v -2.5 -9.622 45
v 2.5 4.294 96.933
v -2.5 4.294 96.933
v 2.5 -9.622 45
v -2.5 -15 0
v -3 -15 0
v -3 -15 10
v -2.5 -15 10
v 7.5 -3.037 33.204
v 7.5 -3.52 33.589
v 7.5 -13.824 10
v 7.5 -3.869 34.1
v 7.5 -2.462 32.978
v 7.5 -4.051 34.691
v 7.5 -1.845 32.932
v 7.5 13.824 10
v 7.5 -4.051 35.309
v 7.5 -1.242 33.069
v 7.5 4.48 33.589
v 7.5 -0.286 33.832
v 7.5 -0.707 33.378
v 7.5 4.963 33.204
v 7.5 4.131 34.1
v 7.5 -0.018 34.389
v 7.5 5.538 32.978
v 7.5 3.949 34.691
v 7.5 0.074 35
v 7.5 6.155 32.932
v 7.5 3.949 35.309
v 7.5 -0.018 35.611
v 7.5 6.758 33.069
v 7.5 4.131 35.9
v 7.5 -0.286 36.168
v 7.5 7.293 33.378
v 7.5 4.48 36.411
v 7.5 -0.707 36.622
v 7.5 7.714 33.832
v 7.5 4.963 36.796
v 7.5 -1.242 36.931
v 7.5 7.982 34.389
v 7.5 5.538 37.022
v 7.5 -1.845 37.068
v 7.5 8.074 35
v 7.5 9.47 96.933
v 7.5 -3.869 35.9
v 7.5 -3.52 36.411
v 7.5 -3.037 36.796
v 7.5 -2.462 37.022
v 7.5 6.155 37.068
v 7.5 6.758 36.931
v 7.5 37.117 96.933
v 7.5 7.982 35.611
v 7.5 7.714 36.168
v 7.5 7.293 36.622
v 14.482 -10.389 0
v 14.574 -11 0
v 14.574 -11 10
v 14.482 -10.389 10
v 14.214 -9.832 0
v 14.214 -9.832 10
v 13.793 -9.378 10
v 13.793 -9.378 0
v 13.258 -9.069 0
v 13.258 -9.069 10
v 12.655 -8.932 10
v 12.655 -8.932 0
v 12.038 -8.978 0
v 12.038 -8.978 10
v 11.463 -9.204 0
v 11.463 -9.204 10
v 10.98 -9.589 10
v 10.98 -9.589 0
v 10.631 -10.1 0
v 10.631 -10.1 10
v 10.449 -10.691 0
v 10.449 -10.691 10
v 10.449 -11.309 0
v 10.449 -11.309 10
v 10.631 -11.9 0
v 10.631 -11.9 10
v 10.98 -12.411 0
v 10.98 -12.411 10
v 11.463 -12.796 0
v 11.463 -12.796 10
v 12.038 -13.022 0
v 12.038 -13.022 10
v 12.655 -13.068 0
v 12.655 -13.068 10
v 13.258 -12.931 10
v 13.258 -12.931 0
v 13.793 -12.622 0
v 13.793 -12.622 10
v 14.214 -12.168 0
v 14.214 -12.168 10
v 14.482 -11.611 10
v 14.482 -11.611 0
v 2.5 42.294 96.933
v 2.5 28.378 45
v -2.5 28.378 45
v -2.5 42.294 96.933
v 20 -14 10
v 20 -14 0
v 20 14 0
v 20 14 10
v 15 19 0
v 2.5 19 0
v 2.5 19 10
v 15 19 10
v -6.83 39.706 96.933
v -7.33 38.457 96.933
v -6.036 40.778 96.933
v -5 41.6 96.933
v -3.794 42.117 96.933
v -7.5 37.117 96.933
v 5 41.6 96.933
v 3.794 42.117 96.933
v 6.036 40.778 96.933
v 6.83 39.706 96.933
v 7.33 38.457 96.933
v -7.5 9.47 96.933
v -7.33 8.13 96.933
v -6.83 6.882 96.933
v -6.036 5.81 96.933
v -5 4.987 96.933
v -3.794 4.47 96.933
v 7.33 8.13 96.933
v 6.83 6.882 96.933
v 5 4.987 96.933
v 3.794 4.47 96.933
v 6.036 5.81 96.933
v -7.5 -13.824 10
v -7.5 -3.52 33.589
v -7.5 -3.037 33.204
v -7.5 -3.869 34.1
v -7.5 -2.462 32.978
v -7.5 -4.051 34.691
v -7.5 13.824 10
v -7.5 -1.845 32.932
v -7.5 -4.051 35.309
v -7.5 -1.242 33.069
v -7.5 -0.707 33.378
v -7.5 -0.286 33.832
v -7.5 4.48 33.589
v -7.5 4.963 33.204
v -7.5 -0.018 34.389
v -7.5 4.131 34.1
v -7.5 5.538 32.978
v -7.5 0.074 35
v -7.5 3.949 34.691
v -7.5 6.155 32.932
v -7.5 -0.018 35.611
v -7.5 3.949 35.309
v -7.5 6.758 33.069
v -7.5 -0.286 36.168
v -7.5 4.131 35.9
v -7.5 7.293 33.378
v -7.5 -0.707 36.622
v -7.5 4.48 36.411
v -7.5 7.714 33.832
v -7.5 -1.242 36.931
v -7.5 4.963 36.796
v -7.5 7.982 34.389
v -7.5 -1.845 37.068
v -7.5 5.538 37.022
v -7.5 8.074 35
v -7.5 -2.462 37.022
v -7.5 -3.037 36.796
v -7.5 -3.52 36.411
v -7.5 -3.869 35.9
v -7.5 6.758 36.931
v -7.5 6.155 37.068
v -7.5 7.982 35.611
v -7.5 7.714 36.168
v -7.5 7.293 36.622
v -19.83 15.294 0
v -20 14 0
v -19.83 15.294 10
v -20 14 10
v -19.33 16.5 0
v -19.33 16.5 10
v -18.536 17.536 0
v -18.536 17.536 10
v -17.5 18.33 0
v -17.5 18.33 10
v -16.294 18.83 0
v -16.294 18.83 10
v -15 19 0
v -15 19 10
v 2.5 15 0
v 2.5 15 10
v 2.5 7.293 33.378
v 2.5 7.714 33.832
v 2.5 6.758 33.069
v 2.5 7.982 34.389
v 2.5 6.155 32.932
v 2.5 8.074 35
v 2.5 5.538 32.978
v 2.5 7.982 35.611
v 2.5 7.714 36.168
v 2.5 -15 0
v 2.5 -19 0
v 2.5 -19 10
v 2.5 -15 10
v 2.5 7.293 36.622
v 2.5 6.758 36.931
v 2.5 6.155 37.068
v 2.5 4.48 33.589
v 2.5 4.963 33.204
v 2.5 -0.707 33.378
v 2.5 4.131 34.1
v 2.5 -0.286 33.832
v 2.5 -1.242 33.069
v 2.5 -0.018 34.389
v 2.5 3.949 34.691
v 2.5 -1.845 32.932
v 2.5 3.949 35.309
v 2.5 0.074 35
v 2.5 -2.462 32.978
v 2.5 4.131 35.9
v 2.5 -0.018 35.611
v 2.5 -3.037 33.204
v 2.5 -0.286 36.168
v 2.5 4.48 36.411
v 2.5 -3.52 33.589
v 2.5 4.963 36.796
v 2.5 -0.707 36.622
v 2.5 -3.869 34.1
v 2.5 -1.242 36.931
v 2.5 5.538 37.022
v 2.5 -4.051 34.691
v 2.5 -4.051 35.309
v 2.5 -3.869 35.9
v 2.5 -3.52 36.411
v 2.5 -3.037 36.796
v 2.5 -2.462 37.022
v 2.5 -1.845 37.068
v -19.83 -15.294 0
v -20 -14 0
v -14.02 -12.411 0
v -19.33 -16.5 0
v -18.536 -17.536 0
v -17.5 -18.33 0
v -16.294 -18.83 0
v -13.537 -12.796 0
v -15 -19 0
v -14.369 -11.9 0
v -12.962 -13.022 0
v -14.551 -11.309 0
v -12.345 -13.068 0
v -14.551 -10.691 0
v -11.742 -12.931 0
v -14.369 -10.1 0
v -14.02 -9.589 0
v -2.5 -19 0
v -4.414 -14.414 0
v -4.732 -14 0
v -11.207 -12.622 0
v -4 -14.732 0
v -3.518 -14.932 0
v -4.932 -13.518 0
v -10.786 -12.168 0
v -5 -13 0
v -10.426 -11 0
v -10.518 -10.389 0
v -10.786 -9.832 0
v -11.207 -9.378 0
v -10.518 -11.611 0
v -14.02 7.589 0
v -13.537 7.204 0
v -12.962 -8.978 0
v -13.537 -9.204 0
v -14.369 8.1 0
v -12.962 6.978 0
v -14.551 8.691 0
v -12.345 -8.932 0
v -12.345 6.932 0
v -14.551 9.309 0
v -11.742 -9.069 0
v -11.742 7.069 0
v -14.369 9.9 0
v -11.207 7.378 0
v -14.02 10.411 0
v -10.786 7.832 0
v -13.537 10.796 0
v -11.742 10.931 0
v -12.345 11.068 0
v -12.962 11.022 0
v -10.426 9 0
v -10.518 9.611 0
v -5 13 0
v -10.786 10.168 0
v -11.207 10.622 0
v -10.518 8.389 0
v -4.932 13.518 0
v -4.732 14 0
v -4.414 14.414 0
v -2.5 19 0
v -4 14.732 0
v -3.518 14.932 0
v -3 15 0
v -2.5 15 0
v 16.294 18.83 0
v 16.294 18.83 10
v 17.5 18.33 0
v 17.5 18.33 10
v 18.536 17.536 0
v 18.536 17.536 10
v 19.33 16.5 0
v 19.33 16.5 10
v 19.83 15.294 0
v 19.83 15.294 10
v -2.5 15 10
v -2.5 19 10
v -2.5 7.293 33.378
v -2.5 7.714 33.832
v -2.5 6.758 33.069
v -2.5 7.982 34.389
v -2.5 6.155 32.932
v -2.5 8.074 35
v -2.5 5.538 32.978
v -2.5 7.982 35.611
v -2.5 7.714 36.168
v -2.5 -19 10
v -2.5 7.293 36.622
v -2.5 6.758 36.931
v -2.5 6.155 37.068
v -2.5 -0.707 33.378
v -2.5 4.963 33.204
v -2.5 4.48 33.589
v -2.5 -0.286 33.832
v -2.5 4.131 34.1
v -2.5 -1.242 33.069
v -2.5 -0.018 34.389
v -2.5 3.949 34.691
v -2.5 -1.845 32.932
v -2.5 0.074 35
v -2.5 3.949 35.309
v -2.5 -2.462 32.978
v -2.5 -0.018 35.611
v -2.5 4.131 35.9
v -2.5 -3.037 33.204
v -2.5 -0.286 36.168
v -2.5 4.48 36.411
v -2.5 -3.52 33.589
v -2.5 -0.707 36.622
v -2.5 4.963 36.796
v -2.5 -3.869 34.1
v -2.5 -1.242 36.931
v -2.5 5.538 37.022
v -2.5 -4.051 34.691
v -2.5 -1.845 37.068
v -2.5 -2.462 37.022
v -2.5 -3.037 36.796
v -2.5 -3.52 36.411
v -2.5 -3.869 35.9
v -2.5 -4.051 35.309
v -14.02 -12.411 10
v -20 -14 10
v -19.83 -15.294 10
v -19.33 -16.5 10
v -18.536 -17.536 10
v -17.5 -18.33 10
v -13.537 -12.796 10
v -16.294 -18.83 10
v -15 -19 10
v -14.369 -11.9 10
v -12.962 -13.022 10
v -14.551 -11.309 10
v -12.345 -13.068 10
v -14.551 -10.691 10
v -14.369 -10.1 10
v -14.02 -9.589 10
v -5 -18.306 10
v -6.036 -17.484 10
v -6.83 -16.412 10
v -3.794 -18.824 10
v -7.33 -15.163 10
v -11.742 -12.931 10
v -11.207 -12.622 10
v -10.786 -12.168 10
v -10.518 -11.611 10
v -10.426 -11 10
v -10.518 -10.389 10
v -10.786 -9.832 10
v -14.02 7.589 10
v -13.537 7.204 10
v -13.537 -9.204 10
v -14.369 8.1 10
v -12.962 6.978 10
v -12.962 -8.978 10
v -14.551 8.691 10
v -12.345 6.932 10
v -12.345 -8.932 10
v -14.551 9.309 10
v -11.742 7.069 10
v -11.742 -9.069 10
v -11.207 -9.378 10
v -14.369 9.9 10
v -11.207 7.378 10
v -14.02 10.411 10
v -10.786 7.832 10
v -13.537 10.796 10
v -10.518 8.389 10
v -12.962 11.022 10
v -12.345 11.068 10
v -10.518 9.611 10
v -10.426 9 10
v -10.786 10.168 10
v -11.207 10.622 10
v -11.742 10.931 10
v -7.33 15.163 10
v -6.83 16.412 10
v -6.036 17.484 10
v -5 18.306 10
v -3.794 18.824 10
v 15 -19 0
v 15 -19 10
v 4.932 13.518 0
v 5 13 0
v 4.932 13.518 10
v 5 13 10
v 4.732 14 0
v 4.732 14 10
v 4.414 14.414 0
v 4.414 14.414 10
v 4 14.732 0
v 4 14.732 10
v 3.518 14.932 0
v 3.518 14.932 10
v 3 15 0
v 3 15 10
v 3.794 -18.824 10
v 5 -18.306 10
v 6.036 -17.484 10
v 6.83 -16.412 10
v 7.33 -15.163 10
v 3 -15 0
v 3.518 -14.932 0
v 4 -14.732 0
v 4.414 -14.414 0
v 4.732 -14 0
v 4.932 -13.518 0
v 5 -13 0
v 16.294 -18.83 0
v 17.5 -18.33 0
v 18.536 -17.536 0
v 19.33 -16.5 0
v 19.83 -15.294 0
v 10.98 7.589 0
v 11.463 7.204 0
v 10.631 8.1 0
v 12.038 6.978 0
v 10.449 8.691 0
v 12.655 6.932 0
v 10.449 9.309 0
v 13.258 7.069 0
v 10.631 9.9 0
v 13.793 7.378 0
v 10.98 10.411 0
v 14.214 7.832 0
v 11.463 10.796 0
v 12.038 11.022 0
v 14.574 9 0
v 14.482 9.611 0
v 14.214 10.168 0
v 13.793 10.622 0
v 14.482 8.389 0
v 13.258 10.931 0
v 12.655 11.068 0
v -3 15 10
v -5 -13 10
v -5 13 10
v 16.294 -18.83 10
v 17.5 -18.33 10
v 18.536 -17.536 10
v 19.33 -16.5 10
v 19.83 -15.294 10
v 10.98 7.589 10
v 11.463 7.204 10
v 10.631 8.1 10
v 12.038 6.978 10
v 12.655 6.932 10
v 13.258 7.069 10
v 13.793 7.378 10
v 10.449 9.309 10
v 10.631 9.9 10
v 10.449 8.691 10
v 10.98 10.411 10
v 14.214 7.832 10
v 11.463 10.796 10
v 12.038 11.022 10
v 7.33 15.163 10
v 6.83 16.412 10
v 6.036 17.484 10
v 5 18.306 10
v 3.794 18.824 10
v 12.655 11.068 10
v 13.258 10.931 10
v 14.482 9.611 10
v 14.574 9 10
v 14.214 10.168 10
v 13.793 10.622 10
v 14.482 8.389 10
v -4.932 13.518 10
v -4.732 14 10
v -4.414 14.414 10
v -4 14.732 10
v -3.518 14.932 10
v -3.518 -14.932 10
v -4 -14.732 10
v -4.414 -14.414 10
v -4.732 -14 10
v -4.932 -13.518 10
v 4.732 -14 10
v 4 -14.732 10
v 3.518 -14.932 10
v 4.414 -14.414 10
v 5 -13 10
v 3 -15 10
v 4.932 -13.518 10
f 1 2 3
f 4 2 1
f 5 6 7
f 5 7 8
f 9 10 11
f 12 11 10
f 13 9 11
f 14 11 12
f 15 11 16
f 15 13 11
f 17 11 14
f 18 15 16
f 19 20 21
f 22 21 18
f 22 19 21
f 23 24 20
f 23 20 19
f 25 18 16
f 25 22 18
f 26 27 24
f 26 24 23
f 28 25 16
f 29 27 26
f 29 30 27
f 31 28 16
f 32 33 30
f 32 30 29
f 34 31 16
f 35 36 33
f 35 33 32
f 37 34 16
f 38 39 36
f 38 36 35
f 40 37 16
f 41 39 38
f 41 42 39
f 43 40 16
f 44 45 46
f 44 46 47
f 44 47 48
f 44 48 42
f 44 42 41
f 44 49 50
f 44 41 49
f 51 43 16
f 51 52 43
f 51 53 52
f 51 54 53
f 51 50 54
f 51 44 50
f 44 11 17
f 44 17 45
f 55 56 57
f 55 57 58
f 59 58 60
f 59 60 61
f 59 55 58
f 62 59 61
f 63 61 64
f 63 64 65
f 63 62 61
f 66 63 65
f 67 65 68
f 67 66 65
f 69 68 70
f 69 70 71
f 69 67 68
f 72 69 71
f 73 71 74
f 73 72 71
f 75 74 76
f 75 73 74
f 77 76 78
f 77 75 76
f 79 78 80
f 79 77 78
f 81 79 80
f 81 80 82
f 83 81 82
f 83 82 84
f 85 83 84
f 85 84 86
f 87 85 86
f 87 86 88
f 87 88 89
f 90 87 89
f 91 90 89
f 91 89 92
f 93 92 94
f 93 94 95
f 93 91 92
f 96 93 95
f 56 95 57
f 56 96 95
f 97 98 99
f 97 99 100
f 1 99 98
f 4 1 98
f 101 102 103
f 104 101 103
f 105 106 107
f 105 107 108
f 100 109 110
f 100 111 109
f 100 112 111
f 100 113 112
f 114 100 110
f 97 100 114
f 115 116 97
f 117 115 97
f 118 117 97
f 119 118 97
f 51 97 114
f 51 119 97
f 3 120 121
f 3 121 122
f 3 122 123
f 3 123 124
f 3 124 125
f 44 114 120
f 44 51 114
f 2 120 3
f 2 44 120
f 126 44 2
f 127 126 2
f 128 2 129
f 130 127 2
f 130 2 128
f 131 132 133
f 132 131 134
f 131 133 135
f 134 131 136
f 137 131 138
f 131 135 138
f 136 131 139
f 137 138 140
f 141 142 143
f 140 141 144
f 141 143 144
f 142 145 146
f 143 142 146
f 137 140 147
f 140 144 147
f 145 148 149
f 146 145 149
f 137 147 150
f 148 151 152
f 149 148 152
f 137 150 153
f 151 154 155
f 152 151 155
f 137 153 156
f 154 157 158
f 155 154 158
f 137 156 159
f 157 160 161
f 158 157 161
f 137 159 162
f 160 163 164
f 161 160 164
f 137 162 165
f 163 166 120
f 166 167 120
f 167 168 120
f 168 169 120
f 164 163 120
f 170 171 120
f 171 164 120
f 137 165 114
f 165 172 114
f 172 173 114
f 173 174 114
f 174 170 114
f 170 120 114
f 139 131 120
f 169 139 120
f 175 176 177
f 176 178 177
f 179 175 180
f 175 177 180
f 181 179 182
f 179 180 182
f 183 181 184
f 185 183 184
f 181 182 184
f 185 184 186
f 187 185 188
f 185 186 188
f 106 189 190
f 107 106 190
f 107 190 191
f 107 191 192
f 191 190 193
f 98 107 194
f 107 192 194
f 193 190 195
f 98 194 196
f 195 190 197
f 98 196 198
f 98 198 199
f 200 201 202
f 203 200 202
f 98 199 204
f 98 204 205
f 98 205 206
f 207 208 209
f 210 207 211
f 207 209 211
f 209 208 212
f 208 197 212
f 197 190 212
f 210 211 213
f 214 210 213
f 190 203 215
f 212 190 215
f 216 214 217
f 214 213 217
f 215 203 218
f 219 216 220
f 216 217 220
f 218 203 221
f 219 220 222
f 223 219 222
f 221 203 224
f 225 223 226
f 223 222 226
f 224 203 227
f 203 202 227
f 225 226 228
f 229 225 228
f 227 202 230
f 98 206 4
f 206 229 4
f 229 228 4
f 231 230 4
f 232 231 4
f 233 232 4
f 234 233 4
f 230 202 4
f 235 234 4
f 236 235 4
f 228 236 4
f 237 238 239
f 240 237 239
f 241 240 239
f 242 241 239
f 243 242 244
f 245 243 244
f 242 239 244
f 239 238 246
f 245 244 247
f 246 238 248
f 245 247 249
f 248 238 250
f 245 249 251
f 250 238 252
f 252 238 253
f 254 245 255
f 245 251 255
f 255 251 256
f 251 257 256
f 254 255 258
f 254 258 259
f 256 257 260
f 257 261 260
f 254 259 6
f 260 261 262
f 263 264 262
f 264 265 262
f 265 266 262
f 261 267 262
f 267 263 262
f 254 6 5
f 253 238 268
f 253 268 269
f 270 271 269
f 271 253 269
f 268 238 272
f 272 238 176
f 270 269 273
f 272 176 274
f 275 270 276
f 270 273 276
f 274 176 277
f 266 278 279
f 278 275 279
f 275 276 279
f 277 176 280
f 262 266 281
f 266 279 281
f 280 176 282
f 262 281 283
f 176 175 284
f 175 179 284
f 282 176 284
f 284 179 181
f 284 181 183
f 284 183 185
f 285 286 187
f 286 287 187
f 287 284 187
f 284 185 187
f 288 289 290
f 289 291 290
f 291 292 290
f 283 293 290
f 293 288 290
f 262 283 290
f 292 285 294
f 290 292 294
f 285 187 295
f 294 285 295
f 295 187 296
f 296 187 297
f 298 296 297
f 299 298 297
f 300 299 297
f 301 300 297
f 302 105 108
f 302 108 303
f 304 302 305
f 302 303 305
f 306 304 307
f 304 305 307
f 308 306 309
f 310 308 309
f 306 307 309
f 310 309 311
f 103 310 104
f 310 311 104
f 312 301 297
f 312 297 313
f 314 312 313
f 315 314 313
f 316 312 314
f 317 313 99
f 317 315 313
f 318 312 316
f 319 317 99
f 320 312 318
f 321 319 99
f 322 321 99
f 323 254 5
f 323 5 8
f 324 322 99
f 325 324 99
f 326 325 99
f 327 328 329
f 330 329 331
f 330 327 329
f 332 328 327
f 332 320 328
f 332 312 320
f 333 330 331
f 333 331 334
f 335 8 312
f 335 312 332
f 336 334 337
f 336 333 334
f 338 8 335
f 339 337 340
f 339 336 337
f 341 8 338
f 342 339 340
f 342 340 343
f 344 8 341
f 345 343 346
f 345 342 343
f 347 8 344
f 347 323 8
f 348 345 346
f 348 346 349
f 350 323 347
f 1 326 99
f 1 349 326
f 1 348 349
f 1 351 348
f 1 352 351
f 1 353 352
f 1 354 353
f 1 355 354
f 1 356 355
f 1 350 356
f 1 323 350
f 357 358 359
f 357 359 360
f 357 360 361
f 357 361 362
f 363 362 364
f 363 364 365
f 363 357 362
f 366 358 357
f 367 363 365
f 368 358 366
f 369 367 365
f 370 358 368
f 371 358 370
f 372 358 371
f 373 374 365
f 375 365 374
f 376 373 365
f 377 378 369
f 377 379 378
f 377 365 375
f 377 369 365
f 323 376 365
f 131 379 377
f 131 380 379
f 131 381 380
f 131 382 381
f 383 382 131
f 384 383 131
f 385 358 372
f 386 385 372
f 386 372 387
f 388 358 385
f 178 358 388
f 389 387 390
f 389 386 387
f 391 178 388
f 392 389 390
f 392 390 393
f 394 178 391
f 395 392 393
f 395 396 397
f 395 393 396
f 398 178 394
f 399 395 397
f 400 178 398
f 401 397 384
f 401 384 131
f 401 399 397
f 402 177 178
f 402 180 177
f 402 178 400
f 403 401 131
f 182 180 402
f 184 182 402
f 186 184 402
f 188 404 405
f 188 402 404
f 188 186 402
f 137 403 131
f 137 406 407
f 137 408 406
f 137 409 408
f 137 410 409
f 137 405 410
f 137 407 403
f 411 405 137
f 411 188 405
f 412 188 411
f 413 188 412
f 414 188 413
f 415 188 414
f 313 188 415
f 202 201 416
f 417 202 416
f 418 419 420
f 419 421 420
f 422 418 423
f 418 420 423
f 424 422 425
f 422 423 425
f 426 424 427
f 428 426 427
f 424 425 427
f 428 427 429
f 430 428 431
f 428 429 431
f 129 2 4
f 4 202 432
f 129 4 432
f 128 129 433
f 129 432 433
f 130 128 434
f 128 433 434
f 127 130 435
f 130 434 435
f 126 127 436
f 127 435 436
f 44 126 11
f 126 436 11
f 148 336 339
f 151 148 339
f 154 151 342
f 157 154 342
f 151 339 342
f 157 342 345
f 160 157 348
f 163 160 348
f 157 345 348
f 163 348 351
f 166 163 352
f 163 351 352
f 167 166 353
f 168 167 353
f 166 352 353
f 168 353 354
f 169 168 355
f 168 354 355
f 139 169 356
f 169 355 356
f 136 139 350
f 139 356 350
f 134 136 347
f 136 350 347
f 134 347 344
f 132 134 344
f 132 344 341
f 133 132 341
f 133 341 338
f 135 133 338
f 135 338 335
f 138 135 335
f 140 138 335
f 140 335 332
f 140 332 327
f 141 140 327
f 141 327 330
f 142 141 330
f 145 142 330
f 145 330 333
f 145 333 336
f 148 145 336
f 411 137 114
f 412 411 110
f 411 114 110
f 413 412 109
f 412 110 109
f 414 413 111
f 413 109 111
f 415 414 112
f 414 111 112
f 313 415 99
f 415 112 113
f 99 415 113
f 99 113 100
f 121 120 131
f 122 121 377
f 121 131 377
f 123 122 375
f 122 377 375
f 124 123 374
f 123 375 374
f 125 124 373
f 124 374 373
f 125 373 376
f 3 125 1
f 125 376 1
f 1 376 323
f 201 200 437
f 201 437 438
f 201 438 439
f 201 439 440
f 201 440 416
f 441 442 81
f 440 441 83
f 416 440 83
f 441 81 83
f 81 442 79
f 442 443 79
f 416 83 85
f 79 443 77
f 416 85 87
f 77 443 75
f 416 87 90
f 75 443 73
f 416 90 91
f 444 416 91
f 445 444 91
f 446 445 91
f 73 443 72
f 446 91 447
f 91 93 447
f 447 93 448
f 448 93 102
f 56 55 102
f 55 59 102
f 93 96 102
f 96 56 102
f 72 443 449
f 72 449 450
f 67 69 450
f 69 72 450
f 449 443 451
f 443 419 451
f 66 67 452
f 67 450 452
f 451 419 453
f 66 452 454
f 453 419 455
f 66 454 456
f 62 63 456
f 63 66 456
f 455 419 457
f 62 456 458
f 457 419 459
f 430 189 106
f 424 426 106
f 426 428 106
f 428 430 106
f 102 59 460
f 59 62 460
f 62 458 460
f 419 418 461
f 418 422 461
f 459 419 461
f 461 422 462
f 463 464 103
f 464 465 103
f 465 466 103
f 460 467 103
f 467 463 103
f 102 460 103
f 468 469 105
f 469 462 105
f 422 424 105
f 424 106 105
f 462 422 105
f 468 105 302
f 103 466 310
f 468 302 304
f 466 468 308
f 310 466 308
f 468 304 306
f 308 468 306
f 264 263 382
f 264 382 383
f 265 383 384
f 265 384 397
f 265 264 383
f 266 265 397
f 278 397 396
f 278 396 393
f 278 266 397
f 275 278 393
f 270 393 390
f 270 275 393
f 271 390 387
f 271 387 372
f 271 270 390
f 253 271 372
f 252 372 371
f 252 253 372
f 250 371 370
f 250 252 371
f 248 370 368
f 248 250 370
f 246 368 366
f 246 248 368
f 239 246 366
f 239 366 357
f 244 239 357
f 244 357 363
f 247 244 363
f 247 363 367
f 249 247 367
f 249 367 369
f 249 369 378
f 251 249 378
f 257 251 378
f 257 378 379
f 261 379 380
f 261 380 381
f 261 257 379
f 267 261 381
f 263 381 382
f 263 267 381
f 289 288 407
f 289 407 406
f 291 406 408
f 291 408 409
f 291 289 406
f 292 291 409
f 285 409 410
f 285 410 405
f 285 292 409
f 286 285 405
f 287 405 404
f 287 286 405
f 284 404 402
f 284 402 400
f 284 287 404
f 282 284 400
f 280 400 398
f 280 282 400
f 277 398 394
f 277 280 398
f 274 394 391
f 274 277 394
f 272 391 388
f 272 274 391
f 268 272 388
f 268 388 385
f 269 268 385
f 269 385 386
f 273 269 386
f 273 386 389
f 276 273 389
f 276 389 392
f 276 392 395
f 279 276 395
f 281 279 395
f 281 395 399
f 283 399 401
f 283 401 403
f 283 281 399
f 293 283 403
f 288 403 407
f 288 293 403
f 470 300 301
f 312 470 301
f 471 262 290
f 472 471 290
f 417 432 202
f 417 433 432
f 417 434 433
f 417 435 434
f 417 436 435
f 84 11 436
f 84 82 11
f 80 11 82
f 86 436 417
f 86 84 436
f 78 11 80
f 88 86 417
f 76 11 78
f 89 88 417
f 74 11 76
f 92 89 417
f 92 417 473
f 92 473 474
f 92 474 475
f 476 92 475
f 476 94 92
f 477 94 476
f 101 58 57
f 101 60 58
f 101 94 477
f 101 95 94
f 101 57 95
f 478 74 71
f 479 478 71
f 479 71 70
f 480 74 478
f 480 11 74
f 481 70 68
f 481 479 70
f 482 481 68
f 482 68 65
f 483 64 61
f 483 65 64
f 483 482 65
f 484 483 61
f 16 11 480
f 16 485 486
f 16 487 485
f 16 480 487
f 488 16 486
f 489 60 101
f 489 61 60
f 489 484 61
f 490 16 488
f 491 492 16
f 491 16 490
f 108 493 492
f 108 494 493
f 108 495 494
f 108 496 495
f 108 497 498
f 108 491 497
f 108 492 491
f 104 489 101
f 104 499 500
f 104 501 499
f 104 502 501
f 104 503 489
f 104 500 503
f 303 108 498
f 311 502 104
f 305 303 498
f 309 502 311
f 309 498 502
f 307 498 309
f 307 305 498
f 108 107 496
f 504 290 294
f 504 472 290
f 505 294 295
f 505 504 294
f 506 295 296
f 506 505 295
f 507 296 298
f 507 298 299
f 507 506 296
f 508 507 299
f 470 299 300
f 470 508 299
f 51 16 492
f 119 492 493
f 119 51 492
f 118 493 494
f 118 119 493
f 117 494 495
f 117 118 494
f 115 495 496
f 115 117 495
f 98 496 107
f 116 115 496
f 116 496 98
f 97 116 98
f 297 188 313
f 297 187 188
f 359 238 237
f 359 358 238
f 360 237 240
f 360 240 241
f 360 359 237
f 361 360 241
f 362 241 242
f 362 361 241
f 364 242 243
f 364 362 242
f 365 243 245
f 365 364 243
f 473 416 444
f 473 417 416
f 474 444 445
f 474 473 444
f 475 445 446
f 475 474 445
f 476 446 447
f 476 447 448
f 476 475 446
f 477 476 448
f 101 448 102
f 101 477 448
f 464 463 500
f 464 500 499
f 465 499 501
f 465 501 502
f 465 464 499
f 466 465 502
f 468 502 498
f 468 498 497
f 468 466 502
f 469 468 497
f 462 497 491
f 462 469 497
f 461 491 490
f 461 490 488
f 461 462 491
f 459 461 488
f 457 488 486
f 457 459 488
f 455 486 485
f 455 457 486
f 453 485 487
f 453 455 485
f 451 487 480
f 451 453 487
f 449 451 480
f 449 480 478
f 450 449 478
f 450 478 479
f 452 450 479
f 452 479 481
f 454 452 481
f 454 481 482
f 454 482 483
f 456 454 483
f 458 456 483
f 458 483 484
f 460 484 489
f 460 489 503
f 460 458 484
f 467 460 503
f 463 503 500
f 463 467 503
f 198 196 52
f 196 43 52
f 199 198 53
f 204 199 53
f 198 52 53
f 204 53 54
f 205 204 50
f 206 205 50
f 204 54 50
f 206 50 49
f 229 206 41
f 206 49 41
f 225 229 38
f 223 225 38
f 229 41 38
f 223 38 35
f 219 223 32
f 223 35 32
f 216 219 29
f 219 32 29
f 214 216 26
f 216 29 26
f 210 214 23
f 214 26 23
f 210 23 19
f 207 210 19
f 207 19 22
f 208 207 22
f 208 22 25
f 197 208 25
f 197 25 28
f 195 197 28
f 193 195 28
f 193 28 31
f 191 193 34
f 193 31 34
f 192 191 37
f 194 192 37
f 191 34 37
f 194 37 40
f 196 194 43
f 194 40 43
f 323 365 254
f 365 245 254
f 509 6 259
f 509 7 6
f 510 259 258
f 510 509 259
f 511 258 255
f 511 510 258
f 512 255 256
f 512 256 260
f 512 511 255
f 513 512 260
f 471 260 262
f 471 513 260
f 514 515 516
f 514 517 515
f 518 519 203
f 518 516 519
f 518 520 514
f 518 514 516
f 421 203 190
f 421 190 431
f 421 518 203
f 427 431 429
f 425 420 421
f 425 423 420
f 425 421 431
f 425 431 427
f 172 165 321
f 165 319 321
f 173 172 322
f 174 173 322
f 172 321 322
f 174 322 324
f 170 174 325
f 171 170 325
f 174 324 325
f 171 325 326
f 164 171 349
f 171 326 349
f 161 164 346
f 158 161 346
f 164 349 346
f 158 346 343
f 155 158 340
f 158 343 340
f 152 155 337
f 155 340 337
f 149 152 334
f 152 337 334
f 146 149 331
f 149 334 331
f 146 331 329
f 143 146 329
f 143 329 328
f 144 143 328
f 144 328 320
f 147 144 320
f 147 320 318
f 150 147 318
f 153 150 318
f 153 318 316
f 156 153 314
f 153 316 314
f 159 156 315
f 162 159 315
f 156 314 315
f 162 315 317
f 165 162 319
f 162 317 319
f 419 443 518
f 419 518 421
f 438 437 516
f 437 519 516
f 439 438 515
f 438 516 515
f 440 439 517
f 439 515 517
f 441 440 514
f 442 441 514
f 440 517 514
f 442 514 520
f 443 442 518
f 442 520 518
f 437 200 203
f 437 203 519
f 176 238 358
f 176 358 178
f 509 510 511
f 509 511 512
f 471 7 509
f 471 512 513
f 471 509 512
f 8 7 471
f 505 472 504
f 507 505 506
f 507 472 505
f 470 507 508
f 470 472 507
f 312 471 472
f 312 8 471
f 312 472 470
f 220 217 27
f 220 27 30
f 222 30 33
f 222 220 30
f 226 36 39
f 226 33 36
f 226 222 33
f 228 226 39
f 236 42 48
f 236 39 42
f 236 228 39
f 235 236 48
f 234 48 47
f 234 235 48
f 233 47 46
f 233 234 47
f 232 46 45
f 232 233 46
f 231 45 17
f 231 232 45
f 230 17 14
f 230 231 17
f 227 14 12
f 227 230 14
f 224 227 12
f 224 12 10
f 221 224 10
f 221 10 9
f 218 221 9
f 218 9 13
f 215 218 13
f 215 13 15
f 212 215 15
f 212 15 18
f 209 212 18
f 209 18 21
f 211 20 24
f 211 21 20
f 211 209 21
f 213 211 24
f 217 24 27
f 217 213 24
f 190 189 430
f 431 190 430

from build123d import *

# Parameters (mm, degrees)
F0_W      = 40
F0_H      = 38
F0_R      = 2.074
F0_W_2    = 10
F0_H_2    = 30
F1_DEPTH  = 10
F2_R      = 5
F3_R      = 2
F5_DEPTH  = 7.5
F6_R      = 5
F8_W      = 5
F8_H      = 45
F9_DEPTH  = 50
F7_R      = 2.074
F10_DEPTH = 25


with BuildPart() as f1:
    # F0 (on Top) → F1 (new body)
    with BuildSketch(Plane.XY):
        Rectangle(F0_W, F0_H)
        with Locations((-12.5, -11)):
            Circle(F0_R, mode=Mode.SUBTRACT)
        with Locations((12.5, -11)):
            Circle(F0_R, mode=Mode.SUBTRACT)
        with Locations((-12.5, 9)):
            Circle(F0_R, mode=Mode.SUBTRACT)
        Rectangle(F0_W_2, F0_H_2, mode=Mode.SUBTRACT)
        with Locations((12.5, 9)):
            Circle(F0_R, mode=Mode.SUBTRACT)
    extrude(amount=F1_DEPTH)

    # F2
    f2_edges = [f1.edges().sort_by_distance(p)[0] for p in [
        (-20, 19, 5),
        (20, 19, 5),
        (20, -19, 5),
        (-20, -19, 5),
    ]]
    fillet(f2_edges, radius=F2_R)

    # F3
    f3_edges = [f1.edges().sort_by_distance(p)[0] for p in [
        (-5, 15, 5),
        (5, 15, 5),
        (-5, -15, 5),
        (5, -15, 5),
    ]]
    fillet(f3_edges, radius=F3_R)

    # F4 (on Right) → F5 (join, symmetric)
    with BuildSketch(Plane.YZ):
        Polygon((42.293714, 96.933324), (4.293714, 96.933324), (-19, 10), (19, 10), align=None)
    extrude(amount=F5_DEPTH, both=True)

    # F6
    f6_edges = [f1.edges().sort_by_distance(p)[0] for p in [
        (-7.5, -7.353143, 53.466662),
        (7.5, -7.353143, 53.466662),
        (-7.5, 30.646857, 53.466662),
        (7.5, 30.646857, 53.466662),
    ]]
    fillet(f6_edges, radius=F6_R)

    # F8 (on Front) → F9 (cut, symmetric)
    with BuildSketch(Plane.XZ):
        with Locations((0, 22.5)):
            Rectangle(F8_W, F8_H)
    extrude(amount=F9_DEPTH, both=True, mode=Mode.SUBTRACT)

    # F7 (on Right) → F10 (cut, symmetric)
    with BuildSketch(Plane.YZ):
        with Locations((-2, 35)):
            Circle(F7_R)
        with Locations((6, 35)):
            Circle(F7_R)
    extrude(amount=F10_DEPTH, both=True, mode=Mode.SUBTRACT)


solid = f1.part
